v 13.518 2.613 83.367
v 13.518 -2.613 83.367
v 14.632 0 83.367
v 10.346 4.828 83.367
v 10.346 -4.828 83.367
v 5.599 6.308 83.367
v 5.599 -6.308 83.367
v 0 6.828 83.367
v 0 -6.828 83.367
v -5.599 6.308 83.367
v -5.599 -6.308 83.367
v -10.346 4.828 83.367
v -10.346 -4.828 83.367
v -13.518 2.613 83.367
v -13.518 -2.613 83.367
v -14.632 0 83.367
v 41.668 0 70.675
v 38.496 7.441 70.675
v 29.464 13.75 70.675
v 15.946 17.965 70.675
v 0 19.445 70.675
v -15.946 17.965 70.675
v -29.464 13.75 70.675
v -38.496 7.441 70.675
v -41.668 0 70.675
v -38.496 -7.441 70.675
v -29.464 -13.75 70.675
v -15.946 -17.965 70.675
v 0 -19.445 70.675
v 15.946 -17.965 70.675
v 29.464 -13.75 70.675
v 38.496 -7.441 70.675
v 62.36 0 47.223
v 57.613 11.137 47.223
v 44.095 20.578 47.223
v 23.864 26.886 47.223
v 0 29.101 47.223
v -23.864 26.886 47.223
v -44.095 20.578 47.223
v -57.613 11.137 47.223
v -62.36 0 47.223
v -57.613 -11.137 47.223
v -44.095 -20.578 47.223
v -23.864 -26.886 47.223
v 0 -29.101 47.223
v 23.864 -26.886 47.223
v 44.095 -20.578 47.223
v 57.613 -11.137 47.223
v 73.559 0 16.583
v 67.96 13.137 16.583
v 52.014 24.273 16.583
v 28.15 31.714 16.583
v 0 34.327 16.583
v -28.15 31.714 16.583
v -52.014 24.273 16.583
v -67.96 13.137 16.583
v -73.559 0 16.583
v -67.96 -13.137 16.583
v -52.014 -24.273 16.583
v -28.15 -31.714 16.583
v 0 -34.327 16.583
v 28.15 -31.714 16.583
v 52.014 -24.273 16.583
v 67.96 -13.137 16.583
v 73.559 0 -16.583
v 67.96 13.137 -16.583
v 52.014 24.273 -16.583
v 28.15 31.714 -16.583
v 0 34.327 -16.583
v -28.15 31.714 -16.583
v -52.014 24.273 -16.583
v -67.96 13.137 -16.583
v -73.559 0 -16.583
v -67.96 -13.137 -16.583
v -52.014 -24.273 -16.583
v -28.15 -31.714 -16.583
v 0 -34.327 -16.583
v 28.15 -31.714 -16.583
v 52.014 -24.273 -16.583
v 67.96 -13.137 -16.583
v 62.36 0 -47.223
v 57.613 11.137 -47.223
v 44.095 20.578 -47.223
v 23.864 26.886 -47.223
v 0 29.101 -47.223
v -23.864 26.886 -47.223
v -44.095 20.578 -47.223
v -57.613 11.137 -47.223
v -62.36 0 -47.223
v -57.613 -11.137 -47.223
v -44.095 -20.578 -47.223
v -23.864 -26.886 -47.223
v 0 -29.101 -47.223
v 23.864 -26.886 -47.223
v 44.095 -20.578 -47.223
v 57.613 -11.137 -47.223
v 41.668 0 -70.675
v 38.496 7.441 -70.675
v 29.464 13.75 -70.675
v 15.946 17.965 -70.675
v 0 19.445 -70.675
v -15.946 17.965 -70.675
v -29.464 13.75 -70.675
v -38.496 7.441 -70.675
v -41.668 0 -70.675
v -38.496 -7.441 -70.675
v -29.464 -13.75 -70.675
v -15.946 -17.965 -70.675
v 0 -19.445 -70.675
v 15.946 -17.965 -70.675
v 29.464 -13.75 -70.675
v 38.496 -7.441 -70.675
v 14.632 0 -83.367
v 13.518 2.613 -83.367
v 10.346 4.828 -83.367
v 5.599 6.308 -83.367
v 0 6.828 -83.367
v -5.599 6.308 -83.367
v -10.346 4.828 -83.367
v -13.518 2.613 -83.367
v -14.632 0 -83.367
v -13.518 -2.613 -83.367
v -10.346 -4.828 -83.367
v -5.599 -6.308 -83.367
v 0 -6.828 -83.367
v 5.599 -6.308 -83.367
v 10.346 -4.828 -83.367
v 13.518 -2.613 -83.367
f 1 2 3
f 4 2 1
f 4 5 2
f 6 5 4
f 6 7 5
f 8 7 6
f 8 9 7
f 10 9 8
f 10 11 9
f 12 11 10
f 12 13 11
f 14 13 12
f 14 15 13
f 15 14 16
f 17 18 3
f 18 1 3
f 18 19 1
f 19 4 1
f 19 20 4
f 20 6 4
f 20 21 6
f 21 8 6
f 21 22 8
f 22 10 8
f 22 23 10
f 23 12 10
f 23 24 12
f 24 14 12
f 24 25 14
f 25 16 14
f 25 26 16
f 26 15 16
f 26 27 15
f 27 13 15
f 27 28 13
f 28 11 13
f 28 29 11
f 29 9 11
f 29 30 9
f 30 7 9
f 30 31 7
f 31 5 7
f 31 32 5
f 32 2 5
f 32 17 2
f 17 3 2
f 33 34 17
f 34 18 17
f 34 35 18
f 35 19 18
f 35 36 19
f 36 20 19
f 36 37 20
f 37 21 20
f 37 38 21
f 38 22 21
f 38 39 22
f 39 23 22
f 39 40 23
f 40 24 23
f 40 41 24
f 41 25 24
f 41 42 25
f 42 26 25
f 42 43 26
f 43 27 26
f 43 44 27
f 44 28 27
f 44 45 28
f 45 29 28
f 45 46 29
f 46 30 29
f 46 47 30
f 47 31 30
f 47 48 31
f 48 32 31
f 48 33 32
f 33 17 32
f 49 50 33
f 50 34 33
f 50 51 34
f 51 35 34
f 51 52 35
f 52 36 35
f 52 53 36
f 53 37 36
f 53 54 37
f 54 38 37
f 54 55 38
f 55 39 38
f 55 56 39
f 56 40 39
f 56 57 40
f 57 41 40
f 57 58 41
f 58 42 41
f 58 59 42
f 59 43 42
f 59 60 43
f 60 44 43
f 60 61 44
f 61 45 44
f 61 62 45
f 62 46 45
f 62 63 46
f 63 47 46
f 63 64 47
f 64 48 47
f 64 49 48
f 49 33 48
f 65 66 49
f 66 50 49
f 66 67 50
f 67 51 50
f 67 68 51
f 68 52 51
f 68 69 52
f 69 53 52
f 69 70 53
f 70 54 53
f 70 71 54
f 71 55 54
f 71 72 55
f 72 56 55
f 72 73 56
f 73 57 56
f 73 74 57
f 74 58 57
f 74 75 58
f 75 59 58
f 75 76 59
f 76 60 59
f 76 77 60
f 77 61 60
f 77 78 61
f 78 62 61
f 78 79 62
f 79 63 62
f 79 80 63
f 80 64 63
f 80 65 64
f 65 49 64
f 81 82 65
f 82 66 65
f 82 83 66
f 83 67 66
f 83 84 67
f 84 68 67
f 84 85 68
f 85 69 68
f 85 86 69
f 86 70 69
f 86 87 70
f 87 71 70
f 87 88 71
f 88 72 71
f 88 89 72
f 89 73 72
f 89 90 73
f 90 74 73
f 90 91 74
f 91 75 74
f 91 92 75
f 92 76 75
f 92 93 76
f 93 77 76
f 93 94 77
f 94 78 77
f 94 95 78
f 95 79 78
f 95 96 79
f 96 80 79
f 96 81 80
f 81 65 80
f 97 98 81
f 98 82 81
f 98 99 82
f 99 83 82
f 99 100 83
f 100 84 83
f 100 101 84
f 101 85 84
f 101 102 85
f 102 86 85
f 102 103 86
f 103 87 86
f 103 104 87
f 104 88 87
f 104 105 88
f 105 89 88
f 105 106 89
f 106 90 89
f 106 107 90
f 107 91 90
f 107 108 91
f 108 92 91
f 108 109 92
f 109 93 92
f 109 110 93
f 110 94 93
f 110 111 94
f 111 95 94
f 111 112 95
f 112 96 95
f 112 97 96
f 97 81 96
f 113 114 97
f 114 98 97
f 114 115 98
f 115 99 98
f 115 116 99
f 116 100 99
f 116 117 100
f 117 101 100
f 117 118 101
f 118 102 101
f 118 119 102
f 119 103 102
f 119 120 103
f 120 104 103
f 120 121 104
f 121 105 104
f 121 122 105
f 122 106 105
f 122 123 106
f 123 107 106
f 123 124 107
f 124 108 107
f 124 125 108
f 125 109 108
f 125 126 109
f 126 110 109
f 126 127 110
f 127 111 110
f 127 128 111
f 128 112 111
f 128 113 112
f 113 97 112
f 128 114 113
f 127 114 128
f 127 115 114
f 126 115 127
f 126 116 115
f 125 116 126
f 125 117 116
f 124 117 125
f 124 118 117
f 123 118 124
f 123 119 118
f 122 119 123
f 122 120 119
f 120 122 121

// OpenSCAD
// Generated by SolidPython 1.0.1 on 2020-07-29 00:46:51


scale(v = [15, 7, 17]) {
	sphere(r = 5);
}
/***********************************************
*********      SolidPython code:      **********
************************************************
 
# import packages: SolidPython
from solid import *
from solid.utils import *
from itertools import chain, combinations, permutations


class Resize:

    def __init__(self, scad_file):
        self.scad_file = scad_file
        #self.scad_file = import_scad(scad_file)
        # cone/cylinder param:
        self.r1 = 0
        self.r2 = 0
        self.h = 0
        # rectangular prism param:
        self.w = 0
        self.l = 0
        # ellipse param:
        self.r = 0

    # import OpenScad code (file name corresponds to shape)


    # classify shape + parameters
    def assign(self, param1, param2, param3):
        if self.scad_file == 'cone.scad':
            self.r1 = param1
            self.r2 = param2
            self.h = param3
        elif self.scad_file == 'cylinder.scad':
            self.r1 = param1
            self.r2 = param2
            self.h = param3
        elif self.scad_file == 'rectangularPrism.scad':
            self.h = param1
            self.l = param2
            self.w = param3
        else:
            self.r = param1
            self.h = param2

    # resize parameters
    def iterate(self):
        x = range(3, 20, 2)
        i = 1
        if self.scad_file == 'cone.scad':
            tempList = list(permutations(x, 2))
            for temp in tempList:
                param1 = temp[0]
                param2 = temp[1]
                filepath = 'produced_scad_files/' + 'cone' + str(param1) + '_' + str(param2) + '_' + '.scad'
                scad_render_to_file(cylinder(h=param1, r1=param2, r2=0), filepath)

        elif self.scad_file == 'cylinder.scad':
            tempList = list(permutations(x, 3))
            for temp in tempList:
                param1 = temp[0]
                param2 = temp[1]
                filepath = 'produced_scad_files/' + 'cylinder' + str(param1) + '_' + str(param2) + '_' + '.scad'
                scad_render_to_file(cylinder(h=param1, r1=param2, r2=param2), filepath)

        elif self.scad_file == 'rectangularPrism.scad':
            tempList = list(permutations(x, 3))
            for temp in tempList:
                param1 = temp[0]
                param2 = temp[1]
                param3 = temp[2]
                filepath = 'produced_scad_files/' + 'rectangularPrism' + str(param1) + '_' + str(param2) + '_' + str(
                    param3) + '.scad'
                scad_render_to_file(cube(size=(param1, param2, param3)), filepath)

        elif self.scad_file == 'ellipse.scad':
            tempList = list(permutations(x, 4))
            for temp in tempList:
                param1 = temp[0]
                param2 = temp[1]
                param3 = temp[2]
                param4 = temp[3]
                filepath = 'produced_scad_files/' + 'ellipse' + str(param1) + '_' + str(param2) + '_' + str(param3) + '_' + str(param4) + '.scad'
                scad_render_to_file(scale([param1, param2, param3])(sphere(r=param4)), filepath)

    def render_to_scadfile(self):
        scad_render_to_file(scad, 'example.scad') 
 
************************************************/
